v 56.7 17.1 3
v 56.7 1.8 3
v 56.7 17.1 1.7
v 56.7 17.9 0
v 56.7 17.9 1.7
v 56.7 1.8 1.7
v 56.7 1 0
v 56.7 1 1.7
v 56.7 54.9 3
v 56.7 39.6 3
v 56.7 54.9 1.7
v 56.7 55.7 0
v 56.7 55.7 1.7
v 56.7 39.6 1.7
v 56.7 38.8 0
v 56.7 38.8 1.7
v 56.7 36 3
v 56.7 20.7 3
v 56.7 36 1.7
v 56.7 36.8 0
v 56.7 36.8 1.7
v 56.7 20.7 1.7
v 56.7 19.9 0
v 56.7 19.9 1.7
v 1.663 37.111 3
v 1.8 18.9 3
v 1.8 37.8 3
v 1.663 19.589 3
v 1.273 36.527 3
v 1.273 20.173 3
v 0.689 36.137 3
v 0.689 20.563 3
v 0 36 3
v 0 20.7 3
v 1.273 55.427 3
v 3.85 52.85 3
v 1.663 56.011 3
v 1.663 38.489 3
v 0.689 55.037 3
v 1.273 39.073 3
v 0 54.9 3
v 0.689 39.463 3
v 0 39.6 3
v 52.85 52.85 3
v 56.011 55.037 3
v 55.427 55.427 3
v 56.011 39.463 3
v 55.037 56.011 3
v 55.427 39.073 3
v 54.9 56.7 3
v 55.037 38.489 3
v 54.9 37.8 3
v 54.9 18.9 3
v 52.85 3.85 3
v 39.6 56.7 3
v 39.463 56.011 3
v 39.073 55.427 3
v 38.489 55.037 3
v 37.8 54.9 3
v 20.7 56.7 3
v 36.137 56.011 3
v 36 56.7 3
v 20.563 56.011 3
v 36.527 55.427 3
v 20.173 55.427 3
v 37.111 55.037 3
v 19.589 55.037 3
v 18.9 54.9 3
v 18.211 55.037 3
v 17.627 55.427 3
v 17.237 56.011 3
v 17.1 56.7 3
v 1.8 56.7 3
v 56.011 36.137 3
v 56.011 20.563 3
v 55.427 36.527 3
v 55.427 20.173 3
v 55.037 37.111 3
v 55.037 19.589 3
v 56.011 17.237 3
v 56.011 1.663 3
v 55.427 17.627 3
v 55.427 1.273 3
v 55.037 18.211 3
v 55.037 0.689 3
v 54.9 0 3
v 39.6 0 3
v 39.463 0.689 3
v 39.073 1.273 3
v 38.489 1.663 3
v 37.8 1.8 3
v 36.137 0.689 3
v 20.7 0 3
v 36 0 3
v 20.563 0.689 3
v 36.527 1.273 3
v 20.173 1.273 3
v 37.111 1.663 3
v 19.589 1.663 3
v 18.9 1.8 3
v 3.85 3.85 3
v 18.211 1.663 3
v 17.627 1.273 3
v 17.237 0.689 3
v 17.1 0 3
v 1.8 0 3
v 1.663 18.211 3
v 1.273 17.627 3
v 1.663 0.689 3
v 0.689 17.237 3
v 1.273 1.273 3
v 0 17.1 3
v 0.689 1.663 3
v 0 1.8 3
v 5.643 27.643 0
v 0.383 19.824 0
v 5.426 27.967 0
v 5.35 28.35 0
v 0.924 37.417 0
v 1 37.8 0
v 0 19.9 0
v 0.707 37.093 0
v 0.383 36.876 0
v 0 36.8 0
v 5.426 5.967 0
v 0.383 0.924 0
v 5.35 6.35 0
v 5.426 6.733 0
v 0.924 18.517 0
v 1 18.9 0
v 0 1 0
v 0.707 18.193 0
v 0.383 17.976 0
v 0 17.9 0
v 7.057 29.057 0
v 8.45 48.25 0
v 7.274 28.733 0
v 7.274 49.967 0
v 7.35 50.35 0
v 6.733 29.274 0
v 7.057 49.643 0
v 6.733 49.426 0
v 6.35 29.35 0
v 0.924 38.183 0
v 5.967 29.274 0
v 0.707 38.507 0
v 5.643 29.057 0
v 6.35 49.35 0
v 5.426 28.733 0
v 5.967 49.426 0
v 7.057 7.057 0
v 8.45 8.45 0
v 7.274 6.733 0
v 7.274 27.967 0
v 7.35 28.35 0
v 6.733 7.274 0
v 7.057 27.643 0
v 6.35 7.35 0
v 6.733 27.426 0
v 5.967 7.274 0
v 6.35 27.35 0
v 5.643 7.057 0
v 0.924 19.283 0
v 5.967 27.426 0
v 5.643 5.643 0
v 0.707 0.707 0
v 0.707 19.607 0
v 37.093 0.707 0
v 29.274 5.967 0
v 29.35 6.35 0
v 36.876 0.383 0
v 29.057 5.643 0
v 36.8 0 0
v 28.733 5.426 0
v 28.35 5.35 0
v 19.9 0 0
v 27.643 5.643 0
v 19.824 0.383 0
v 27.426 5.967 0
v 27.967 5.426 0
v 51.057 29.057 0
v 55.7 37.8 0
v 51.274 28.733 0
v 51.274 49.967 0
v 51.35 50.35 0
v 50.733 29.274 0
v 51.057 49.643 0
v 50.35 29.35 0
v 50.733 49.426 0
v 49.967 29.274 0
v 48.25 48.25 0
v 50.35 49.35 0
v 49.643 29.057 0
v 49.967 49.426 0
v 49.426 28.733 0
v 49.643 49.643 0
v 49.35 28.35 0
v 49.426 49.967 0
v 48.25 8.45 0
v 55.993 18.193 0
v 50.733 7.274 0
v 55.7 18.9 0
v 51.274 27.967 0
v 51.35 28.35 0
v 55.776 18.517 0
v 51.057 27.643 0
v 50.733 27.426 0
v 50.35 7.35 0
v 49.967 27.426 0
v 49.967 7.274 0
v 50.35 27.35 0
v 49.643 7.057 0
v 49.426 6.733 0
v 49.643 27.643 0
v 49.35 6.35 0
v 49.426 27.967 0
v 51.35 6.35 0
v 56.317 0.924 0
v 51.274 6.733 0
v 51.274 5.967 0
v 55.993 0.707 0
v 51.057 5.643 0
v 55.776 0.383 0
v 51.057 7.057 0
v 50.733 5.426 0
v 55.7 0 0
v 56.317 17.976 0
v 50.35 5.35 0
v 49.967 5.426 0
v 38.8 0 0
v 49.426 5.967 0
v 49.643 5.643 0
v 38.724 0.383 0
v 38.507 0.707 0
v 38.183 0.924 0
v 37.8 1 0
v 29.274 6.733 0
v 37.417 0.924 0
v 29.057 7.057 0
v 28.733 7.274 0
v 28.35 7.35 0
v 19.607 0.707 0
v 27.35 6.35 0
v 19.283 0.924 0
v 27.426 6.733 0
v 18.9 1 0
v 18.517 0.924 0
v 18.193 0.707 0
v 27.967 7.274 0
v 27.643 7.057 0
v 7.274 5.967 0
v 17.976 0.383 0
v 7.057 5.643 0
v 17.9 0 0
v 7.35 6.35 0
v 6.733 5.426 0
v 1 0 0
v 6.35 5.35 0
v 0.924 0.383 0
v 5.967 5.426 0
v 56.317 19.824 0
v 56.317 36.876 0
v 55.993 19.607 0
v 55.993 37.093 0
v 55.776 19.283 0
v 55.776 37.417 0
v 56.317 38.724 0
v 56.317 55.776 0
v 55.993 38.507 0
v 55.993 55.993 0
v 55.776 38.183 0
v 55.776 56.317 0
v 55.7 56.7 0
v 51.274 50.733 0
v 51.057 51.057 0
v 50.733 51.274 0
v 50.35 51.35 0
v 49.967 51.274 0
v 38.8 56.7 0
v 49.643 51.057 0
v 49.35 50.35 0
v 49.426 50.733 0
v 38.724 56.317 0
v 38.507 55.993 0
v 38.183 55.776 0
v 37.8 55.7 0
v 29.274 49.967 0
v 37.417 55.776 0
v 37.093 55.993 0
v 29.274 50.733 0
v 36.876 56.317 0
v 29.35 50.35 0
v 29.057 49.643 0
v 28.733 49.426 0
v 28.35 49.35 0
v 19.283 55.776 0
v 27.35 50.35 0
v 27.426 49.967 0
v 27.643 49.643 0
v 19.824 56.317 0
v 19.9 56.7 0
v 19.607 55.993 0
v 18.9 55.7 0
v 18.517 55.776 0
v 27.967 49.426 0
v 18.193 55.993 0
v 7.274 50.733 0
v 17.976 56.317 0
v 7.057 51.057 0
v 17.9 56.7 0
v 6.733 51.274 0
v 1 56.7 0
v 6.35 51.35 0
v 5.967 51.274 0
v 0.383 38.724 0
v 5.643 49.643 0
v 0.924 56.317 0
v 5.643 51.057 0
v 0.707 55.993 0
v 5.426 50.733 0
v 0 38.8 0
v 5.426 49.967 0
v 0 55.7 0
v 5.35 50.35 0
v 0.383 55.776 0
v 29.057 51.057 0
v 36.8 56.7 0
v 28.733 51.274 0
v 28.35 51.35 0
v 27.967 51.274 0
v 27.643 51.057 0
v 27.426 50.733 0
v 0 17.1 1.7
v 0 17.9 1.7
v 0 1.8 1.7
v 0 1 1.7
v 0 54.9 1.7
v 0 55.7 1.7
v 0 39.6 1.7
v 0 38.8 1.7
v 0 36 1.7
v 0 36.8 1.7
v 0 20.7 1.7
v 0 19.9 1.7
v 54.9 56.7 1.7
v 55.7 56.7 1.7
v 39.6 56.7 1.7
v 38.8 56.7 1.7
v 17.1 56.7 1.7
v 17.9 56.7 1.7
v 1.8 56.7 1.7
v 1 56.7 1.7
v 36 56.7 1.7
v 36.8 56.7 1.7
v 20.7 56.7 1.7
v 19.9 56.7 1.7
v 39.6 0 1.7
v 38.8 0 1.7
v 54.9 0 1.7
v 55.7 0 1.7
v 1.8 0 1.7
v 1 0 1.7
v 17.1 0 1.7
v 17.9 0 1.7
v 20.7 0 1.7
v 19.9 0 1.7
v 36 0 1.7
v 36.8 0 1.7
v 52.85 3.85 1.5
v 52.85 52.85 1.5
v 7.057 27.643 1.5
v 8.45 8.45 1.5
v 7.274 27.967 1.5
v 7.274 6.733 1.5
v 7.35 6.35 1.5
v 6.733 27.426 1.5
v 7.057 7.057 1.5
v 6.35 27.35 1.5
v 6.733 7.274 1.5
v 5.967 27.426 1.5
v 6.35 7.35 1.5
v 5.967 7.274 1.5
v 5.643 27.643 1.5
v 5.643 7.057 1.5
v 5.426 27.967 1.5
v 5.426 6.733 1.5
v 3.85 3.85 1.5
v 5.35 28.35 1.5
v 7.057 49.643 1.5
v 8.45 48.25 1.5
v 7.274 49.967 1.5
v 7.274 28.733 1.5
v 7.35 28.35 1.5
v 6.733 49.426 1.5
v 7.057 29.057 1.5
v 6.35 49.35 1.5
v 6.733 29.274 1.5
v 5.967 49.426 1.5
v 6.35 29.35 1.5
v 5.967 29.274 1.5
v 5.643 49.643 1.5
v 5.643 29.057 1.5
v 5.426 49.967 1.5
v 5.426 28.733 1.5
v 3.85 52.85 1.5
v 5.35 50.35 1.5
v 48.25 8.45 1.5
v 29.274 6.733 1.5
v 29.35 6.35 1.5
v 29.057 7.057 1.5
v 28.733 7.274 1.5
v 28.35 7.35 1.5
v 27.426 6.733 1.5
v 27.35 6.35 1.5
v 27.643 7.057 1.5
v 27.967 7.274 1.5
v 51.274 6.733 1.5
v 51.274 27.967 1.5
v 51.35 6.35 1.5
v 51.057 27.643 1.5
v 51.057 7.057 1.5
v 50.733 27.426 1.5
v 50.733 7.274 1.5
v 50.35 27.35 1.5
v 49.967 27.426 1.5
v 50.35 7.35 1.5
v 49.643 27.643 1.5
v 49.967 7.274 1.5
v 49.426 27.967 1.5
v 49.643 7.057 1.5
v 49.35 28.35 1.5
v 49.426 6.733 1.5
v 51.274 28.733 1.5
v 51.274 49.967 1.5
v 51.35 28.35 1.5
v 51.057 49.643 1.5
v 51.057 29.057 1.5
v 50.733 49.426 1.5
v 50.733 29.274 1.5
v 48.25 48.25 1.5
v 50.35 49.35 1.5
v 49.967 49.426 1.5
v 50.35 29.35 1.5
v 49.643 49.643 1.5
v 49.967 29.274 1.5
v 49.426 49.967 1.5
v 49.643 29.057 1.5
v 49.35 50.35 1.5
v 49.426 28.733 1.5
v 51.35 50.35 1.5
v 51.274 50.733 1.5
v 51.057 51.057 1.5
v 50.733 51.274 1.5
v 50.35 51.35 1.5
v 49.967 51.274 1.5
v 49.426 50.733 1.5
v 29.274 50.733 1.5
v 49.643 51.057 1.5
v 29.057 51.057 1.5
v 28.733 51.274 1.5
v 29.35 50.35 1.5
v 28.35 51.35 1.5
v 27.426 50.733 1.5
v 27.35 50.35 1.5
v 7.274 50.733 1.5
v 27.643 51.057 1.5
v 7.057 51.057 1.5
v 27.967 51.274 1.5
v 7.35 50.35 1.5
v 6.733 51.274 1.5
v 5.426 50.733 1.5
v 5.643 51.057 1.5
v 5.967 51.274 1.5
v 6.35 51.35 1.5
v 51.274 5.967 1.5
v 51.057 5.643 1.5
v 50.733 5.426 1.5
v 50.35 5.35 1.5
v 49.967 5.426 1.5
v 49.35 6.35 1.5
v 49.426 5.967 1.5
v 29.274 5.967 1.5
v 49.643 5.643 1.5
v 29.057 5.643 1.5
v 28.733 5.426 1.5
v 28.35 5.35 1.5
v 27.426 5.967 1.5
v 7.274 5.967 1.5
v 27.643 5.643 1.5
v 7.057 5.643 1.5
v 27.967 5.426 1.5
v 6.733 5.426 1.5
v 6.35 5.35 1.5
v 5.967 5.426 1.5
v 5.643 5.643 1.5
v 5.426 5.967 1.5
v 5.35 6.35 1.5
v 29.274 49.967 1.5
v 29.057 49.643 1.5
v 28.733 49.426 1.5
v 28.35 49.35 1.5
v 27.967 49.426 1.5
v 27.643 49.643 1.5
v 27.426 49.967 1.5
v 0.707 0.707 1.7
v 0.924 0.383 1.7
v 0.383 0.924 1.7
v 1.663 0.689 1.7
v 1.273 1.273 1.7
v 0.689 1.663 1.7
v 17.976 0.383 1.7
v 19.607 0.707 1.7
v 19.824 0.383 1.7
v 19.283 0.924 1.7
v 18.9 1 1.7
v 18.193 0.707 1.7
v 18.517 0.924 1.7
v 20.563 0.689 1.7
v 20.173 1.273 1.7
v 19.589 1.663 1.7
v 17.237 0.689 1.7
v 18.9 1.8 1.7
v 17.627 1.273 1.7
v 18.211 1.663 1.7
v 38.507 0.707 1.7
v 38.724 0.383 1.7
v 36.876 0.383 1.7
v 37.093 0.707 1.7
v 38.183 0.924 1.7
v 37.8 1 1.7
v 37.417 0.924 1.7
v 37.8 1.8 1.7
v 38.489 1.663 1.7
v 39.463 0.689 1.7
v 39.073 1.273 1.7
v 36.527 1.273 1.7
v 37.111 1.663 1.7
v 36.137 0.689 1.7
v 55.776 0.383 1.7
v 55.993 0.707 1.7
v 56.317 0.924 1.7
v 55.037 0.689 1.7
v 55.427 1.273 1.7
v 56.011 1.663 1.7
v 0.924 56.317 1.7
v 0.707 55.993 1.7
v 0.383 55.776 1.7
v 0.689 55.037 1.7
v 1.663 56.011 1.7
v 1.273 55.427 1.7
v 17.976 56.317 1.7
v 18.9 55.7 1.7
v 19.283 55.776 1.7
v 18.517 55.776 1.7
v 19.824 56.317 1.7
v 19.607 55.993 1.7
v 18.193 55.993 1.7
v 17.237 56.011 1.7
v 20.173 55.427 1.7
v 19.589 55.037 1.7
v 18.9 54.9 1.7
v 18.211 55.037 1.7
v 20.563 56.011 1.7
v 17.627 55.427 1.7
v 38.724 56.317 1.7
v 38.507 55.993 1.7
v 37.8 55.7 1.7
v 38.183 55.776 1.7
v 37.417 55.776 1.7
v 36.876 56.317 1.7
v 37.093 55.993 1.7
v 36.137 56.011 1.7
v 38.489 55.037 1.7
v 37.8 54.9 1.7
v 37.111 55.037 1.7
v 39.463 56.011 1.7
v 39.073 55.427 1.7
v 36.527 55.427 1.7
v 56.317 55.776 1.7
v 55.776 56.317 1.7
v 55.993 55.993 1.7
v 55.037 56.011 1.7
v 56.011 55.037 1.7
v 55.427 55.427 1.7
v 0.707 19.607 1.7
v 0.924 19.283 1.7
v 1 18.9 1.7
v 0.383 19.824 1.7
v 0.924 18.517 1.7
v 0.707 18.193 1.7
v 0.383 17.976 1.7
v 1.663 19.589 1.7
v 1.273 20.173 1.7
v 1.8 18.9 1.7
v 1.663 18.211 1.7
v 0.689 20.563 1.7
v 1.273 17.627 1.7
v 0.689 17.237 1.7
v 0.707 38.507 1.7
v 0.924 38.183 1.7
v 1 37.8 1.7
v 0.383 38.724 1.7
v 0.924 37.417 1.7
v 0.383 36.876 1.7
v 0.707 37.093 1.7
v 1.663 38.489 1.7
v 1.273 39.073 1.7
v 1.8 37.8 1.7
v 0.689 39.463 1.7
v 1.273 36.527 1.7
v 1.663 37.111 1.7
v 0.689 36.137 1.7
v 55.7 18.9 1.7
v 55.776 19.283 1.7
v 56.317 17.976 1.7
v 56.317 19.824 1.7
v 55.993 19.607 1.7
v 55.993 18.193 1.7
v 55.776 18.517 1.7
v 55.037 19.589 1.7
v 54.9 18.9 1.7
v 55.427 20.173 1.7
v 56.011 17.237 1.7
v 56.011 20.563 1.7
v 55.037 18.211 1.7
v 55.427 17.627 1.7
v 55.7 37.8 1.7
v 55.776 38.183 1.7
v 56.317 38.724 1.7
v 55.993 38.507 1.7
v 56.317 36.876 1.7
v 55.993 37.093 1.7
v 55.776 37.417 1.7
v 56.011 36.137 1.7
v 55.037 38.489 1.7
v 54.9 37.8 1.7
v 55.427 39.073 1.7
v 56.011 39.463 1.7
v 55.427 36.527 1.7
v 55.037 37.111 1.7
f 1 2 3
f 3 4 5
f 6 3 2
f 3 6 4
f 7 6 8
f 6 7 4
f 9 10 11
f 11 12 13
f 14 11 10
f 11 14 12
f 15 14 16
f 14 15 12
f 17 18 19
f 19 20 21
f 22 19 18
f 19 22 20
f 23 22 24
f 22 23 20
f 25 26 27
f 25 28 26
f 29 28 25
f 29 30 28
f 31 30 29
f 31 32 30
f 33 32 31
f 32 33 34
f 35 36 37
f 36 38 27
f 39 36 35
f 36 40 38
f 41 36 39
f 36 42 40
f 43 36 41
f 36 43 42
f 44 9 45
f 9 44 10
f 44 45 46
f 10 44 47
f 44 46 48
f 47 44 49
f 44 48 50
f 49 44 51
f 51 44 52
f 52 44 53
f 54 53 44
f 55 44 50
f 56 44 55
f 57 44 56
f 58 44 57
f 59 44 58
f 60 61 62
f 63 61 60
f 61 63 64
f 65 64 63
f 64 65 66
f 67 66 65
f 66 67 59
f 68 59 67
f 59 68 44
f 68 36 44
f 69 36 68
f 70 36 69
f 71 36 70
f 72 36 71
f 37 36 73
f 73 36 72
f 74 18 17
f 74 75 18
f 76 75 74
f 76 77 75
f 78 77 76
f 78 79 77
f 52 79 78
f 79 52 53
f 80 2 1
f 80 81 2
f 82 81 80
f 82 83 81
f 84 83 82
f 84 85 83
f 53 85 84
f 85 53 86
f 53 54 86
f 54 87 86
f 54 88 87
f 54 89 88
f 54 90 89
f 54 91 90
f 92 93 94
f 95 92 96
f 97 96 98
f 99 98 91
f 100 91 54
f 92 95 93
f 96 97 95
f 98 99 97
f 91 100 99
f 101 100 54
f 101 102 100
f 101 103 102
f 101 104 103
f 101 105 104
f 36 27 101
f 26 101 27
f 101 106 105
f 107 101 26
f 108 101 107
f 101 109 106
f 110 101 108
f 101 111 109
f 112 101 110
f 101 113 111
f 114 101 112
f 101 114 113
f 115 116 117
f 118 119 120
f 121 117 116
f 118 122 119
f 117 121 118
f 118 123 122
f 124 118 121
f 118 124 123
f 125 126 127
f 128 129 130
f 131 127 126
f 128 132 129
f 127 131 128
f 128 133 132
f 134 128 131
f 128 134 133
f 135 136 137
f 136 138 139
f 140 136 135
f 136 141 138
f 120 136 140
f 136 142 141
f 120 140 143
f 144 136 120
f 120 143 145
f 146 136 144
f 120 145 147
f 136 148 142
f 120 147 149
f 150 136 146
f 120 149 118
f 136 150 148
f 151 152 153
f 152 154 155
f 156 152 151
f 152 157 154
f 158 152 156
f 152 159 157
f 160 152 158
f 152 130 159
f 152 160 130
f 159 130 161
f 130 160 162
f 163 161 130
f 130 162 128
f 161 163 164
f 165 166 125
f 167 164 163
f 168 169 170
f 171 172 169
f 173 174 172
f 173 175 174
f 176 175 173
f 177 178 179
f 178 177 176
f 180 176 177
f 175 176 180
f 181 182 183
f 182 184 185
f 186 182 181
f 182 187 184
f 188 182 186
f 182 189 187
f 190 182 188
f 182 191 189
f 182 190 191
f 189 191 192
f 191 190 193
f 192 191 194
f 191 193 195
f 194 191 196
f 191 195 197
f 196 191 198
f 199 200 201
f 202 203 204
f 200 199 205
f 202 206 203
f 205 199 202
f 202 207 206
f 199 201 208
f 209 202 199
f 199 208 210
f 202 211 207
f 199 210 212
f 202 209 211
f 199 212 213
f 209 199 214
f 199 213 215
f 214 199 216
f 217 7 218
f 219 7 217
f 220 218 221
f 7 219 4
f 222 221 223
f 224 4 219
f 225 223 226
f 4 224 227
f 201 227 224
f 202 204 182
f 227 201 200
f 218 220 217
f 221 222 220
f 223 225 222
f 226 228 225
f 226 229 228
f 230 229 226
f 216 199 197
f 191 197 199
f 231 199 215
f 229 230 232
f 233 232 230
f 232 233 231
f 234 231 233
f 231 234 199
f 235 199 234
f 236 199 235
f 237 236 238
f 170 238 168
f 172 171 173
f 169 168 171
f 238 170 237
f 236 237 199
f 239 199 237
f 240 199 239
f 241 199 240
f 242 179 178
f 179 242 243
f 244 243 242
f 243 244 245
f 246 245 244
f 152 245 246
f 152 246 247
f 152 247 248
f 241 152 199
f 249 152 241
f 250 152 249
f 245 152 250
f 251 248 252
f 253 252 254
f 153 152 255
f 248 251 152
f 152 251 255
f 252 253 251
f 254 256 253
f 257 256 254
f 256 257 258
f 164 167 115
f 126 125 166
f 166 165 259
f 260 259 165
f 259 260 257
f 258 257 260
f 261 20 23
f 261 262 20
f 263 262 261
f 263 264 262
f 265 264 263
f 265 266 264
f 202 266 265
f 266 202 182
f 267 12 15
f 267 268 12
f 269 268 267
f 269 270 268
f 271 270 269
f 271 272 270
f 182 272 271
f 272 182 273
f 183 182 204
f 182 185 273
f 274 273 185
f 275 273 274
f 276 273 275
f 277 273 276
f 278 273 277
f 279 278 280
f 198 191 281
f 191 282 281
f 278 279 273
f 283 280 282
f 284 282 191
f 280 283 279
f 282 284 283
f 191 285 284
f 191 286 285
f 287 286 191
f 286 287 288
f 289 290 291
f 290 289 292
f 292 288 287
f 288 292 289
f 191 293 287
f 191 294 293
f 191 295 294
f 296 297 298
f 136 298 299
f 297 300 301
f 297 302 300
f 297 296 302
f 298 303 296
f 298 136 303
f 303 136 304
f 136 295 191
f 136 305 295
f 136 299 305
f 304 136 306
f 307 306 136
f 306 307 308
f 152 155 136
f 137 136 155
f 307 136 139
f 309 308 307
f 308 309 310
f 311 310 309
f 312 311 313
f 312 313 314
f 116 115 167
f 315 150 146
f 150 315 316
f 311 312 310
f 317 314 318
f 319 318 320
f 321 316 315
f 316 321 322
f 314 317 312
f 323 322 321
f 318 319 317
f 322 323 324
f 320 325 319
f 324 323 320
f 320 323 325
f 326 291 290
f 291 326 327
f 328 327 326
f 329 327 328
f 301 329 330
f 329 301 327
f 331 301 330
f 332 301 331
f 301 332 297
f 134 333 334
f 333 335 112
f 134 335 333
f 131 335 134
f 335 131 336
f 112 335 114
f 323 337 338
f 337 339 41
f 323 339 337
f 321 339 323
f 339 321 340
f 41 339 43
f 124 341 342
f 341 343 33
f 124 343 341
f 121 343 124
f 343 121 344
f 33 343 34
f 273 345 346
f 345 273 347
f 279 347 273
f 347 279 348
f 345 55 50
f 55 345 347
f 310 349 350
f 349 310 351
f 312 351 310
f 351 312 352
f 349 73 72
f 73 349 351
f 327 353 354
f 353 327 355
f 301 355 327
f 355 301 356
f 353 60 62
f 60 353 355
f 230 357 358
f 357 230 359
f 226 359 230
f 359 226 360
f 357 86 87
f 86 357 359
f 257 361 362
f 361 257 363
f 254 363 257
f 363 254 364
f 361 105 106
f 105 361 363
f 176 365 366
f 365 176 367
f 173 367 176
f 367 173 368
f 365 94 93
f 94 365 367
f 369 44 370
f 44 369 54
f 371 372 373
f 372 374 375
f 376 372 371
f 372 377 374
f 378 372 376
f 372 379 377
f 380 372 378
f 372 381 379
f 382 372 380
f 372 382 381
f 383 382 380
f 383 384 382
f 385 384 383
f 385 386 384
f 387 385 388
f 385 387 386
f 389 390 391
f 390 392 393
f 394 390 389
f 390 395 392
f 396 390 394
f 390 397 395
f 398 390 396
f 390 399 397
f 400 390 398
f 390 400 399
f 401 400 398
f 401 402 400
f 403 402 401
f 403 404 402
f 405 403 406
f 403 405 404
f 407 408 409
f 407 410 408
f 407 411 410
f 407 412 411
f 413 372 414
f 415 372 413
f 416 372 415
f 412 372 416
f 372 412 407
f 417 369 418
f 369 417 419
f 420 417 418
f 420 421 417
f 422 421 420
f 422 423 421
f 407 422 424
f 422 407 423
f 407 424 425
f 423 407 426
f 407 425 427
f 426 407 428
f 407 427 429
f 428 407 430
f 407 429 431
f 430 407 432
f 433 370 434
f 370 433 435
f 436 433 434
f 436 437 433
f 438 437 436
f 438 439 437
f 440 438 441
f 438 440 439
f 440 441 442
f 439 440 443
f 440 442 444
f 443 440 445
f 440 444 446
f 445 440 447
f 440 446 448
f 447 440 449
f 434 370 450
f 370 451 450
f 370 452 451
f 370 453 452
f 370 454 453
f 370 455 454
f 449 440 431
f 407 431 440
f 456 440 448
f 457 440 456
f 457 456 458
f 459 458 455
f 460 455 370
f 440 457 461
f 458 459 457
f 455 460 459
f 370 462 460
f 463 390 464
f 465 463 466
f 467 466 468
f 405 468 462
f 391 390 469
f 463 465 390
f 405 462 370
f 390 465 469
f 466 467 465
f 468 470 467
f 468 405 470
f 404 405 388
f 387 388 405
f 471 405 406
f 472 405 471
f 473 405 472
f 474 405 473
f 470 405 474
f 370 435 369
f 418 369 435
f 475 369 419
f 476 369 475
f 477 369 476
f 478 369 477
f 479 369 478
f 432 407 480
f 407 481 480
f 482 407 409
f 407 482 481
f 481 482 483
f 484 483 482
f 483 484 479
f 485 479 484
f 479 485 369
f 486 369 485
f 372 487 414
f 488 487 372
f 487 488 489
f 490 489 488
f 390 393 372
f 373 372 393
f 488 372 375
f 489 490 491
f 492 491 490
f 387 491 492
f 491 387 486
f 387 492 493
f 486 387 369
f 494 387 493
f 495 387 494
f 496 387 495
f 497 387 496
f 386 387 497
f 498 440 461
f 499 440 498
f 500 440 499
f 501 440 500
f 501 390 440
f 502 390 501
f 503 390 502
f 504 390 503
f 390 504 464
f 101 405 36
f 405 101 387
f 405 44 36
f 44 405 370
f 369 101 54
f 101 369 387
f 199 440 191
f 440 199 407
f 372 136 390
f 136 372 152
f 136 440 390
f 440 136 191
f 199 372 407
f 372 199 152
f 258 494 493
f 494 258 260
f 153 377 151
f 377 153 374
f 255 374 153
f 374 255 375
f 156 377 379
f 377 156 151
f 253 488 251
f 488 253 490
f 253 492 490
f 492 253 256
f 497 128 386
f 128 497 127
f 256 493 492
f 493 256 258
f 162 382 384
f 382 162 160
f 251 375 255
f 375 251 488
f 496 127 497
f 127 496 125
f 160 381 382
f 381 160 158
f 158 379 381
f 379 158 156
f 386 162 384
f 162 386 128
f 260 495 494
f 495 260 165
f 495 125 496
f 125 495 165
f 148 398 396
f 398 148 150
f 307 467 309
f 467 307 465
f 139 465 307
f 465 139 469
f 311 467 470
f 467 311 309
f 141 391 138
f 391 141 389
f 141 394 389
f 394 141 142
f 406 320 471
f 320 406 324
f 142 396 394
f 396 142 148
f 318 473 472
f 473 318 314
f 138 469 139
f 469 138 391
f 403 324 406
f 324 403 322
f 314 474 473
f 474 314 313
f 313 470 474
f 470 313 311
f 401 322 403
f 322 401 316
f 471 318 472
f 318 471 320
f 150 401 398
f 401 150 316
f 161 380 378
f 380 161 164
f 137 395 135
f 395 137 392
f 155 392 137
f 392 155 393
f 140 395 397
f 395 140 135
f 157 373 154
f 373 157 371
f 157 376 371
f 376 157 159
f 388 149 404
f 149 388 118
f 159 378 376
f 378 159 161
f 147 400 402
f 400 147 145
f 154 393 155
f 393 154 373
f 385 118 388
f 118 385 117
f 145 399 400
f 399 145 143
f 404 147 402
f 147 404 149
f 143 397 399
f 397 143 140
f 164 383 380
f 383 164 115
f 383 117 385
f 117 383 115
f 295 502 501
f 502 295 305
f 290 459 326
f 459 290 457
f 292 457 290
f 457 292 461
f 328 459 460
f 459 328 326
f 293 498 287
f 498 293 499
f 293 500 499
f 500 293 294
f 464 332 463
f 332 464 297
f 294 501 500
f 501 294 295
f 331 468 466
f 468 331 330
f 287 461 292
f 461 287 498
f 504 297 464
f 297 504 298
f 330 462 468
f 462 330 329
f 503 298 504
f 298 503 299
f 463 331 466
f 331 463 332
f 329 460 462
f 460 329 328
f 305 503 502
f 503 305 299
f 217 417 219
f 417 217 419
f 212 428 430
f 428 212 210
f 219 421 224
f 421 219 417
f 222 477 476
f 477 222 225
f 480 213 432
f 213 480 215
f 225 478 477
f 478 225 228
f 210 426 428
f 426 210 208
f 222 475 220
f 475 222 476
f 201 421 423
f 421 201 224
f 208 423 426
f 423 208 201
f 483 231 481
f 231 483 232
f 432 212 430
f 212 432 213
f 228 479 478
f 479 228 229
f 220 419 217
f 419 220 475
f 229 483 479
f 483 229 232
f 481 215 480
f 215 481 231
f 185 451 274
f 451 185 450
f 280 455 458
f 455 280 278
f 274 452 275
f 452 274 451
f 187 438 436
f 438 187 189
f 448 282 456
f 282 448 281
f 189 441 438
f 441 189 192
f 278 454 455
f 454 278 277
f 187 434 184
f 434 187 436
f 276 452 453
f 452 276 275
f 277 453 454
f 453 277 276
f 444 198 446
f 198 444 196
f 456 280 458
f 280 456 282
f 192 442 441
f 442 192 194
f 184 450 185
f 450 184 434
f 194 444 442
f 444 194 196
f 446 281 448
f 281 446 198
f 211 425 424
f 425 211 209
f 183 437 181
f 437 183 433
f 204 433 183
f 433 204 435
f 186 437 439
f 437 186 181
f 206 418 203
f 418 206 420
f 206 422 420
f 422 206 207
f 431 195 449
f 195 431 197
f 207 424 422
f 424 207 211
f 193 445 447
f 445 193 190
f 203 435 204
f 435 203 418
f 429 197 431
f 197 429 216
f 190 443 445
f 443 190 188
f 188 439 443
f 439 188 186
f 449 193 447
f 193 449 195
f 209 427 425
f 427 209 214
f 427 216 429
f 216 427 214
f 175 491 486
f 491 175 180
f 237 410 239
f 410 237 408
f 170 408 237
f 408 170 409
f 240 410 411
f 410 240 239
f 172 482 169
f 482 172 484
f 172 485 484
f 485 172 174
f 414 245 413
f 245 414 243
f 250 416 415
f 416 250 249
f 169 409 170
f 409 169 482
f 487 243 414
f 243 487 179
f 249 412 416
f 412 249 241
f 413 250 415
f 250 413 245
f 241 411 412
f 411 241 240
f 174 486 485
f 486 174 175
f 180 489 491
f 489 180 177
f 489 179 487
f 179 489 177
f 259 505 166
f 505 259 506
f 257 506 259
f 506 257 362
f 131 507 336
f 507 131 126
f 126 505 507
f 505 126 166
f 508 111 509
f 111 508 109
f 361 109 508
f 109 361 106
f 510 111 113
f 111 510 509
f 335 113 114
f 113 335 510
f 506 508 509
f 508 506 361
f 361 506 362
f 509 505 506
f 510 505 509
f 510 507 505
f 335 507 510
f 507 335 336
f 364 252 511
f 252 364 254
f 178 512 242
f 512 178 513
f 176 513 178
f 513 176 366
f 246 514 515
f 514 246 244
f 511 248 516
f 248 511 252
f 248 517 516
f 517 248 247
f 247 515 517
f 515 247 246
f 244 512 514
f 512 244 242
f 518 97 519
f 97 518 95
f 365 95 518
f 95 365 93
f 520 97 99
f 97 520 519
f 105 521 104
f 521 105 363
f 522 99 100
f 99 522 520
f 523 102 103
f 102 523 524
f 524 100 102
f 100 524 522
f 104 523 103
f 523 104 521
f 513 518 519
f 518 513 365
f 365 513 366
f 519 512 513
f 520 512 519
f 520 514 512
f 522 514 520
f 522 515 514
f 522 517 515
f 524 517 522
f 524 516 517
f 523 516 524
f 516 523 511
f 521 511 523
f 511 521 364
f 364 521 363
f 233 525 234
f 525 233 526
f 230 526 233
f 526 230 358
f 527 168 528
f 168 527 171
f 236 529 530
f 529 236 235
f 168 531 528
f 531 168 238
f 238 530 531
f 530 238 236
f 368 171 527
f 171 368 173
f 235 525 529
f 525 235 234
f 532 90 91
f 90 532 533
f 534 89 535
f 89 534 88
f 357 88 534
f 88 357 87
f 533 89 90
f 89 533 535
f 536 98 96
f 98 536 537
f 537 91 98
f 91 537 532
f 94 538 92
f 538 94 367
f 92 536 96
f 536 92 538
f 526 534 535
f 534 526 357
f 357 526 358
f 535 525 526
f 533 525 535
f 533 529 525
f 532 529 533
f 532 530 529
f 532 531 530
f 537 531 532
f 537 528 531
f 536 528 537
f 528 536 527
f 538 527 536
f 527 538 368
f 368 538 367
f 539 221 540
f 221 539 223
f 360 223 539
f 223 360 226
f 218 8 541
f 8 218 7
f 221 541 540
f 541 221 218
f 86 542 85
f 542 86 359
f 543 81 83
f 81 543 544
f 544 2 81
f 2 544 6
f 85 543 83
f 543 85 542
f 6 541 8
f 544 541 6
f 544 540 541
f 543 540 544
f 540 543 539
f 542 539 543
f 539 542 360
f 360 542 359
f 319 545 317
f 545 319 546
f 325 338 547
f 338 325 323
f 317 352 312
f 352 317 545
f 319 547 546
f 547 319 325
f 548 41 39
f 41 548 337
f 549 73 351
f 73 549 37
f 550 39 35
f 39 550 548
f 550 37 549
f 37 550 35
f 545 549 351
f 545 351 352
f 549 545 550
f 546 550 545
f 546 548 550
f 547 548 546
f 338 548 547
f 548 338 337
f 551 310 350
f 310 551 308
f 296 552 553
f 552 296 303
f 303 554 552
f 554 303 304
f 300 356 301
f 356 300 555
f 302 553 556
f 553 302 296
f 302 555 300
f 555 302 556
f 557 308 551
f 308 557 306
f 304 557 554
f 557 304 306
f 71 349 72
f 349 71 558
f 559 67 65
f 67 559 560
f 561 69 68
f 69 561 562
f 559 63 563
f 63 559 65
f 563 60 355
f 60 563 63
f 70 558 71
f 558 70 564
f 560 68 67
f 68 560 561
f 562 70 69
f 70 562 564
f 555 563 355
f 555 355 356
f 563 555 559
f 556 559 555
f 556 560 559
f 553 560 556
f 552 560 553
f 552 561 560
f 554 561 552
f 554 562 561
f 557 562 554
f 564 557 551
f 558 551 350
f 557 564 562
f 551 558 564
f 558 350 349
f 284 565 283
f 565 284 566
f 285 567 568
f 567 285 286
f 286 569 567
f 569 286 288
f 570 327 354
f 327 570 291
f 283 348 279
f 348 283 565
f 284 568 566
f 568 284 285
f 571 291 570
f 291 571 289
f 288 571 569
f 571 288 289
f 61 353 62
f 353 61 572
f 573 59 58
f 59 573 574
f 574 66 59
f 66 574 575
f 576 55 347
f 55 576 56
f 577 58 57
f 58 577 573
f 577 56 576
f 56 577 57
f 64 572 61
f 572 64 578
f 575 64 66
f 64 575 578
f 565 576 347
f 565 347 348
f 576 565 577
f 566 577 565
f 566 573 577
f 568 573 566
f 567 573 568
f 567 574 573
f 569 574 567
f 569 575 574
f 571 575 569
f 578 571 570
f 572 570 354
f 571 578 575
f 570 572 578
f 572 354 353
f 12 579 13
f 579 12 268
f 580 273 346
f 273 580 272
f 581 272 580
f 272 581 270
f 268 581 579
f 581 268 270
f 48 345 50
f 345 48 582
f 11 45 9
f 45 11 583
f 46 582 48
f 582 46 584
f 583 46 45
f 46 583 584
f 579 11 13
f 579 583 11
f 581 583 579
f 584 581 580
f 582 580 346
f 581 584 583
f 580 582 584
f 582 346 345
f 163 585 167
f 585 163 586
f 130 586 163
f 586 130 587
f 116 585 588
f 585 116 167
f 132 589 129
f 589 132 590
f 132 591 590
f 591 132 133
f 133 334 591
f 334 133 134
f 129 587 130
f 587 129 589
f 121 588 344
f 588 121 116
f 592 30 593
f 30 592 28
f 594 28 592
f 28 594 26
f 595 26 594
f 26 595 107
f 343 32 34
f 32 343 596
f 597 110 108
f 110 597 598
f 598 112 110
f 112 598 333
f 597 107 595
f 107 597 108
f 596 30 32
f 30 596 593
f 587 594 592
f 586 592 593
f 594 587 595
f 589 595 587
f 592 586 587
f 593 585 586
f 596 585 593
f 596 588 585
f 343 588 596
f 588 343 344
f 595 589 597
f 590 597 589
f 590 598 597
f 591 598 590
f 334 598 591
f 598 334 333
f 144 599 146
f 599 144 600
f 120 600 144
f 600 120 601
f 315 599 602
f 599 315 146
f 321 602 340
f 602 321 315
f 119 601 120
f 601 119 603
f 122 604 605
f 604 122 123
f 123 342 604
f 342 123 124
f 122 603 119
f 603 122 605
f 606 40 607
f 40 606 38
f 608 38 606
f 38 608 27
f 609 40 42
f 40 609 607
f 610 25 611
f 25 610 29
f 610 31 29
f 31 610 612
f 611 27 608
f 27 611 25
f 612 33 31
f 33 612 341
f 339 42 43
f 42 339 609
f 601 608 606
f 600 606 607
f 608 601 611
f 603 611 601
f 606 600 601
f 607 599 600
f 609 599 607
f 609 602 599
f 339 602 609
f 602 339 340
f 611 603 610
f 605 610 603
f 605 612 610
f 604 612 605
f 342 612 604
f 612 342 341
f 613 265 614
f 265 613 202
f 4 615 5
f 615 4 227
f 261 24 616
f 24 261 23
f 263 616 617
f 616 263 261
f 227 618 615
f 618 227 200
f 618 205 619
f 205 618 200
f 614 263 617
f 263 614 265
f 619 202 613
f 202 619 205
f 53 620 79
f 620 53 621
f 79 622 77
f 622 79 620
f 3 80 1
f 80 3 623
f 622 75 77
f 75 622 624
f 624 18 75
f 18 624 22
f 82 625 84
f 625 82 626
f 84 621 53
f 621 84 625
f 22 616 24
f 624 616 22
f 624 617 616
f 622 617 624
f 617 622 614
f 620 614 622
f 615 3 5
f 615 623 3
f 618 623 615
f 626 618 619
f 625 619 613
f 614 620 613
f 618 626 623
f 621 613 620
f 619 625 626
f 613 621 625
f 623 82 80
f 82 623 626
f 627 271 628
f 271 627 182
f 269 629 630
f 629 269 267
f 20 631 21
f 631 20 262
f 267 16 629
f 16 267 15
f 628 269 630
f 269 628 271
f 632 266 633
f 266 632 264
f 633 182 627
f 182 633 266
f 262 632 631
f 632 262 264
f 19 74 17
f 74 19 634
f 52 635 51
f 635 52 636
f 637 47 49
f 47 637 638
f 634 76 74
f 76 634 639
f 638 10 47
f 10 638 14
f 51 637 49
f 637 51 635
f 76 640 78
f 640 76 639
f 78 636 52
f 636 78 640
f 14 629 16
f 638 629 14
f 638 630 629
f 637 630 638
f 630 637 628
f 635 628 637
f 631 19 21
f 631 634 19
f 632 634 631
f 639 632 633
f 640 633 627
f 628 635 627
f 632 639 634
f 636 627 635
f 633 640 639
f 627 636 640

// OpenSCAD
//OpenSCAD-Skript

//Moduldefinition mit Parametern für Frontplattensystem im 19mm-Raster
module FrontElem (
//Parameter
//Frontplattenelement
xwert=3,        //Anzahl der Segmente in horizontaler Richtung
ywert=3,        //Anzahl der Segmente in vertikaler Richtung
segment=18.9,   //Kantenlänge des Segments
hght=3.0,       //Höhe des Rands des Frontplattensegments
thick=1.5,      //verbleibende Dicke des Frontplattensegments
wo=1.0,         //Wandstärke oben
wu=2.0,         //Wandstärke unten
//M3-Schrauben
M3=false,       //Bohrungen für M3-Zylinderkopf-Inbusschraube
skd3=5.6,       //Schraubenkopfdurchmesser M3-Schraube
skh3=3.3,       //Schraubenkopfhöhe M3-Schraube
dsh3=3.1,       //Schaftdurchmesser M3-Schraube
dvst3=7,        //Verstärkung für M3-Schraube
//Schneidschrauben 2mmx6mm
B2mm=true,      //Bohrungen für 2mm-Schneidschrauben
skd2=3.6,       //Schraubenkopfdurchmesser 2mm-Schraube (4.4)
skh2=1.3,       //Schraubenkopfhöhe 2mm-Schraube
dsh2=2.0,       //Schaftdurchmesser 2mm-Schraube
dvst2=4.4,      //Verstärkung für 2mm-Schraube
//Beschriftungsfeld eingesenkt
Btext=6.0,      //Breite Beschriftungsband
Ltext=12,       //Länge Beschriftungsband
Dtext=0.3,      //Tiefe Beschriftungsfeld, oder Null
//LED 3mm
LEDdia=3.0,     //Durchmesser LED
//Quadrat-LED
LEDr=5.0,       //Kantenlänge quadratische LED
//Rechteck-LED
LEDB=5.0,       //Breite der Rechteck-LED
LEDH=3.0,       //Höhe der Rechteck-LED
//Hebel-Kippschalter
KSWdia=6.0,     //Schaftdurchmesser Kippschalter
//Drehschalter
RSWdia=9.2,     //Schaftdurchmesser Drehschalter
RSWdist=9.4,    //Mittenabstand Pin
RSWpin=3.0,     //Durchmesser Pin
//Bohrung für Potischaft 6mm
POTdia=6.8,     //Schaftdurchmesser Poti
//Polklemme M4
TRMdia=4.0,     //Bohrung für Polklemme M4
TRSdia=6.0,     //Bohrung für Telefonbuchse 4mm
//MC-Einbaubuchse
MCdia=11.8,     //Bohrung für MC-Buchse 4mm
MCdist=10.4,    //Abstand Abflachungen
//BNC-Einbaubuchse
BNCdia=9.5,     //Durchmesser Bohrung
BNCdist=8.0,    //Abstand Abflachung
//Panelmeter 3-stellig
PM3B=22.5,      //Breite Panelmeter 3-stellig
PM3H=14.5,      //Höhe Panelmeter 3-stellig
//Panelmeter 4-stellig
PM4B=30.0,      //Breite Panelmeter 4-stellig
PM4H=14.2,      //Höhe Panelmeter 4-stellig
//Kaltgerätestecker
KGSW=27.3,      //Länge Ausschnitt in x-Richtung Kaltgerätestecker
KGSH=20,        //Höhe Ausschnitt in y-Richtung Kaltgerätestecker
KGSR=9          //Rundungsdurchmesser Ausschnitt Kaltgerätestecker
)
//Beginn Modul
{
difference(){   //difference 1
union(){        //union 1
difference(){   //difference 2
union(){        //union 2
    //alles, was vor der nächsten geschweiften Klammer steht, wird zusammengefügt (union 2)
//Körper des Frontplattensegments
cube([xwert*segment, ywert*segment, hght]);


}               //union 2 end
    //alles, was vor der nächsten geschweiften Klammer steht, wird davon abgezogen (difference 2)
/*//Einsenkung in das Segment
polyhedron(
               points= [[wu,wu,thick],                                  //0 unten
                        [xwert*segment-wu,wu,thick],                    //1 unten
                        [xwert*segment-wu,ywert*segment-wu,thick],      //2 unten
                        [wu,ywert*segment-wu,thick],                    //3 unten
                        [wo,wo,hght+0.01],                              //4 oben
                        [wo,ywert*segment-wo, hght+0.01],               //5 oben
                        [xwert*segment-wo,ywert*segment-wo,hght+0.01],  //6 oben
                        [xwert*segment-wo,wo,hght+0.01],                //7 oben
                       ],
               faces=  [[0,1,2,3],      //Boden
                        [0,4,7,1],      //Deckel
                        [1,7,6,2],      //Front
                        [2,6,5,3],      //Seitenwand rechts
                        [3,5,4,0],      //Rückwand
                        [4,5,6,7]]      //Seitenwand links
               );  */ 
//Ausschnitt Rahmen VU-Meter
translate([xwert*segment/2-49/2,ywert*segment/2-49/2,thick]) cube([49,49,15]);

/*
//Ausschnitt Schalter
translate([xwert*segment/2-30/2,ywert*segment/2+4.5,-0.1]) cube([30,11,20]);
*/

/*//Ausschnitt Kaltgerätestecker
translate([0,7,0]) {
//Mittenausschnitt
translate([xwert*segment/2-22/2,ywert*segment/2-14,-0.1]) cube([22,14,20]);
//Rundungen
translate([xwert*segment/2-22/2,ywert*segment/2-14,-0.1])cylinder(d=8,h=20,$fn=32);
translate([xwert*segment/2-22/2,ywert*segment/2,-0.1])cylinder(d=8,h=20,$fn=32);
translate([xwert*segment/2+22/2,ywert*segment/2-14,-0.1])cylinder(d=8,h=20,$fn=32);
translate([xwert*segment/2+22/2,ywert*segment/2,-0.1])cylinder(d=8,h=20,$fn=32);
//Seitensegmente
translate([xwert*segment/2-22/2,ywert*segment/2-0.1,-0.1]) cube([22,4+0.1,20]);
translate([xwert*segment/2-22/2,ywert*segment/2-14-4,-0.1]) cube([22,4+0.1,20]);
translate([xwert*segment/2-22/2-4,ywert*segment/2-14,-0.1]) cube([4+0.1,14,20]);
translate([xwert*segment/2+22/2-0.1,ywert*segment/2-14,-0.1]) cube([4+0.1,14,20]);
//Schraubenlöcher
translate([xwert*segment/2-36/2,ywert*segment/2-14/2,-0.1])cylinder(d1=3,d2=7,h=2,$fn=32);
translate([xwert*segment/2+36/2,ywert*segment/2-14/2,-0.1])cylinder(d1=3,d2=7,h=2,$fn=32);
};
*/

/*
//Bohrung für LED mittig (Mindestgröße 1x1)
translate([xwert*segment/2,ywert*segment/2-3,-0.1])  cylinder(d=LEDdia, h=10, $fn=32);
*/

/*
//Bohrung für 2x 3mm-LED nach unten versetzt mit Textfeld darüber (Mindestgröße 1x1, bei 10mm LED 1x2)
translate([xwert*segment/2-3,ywert*segment/2-3,-0.1])  cylinder(d=LEDdia, h=10, $fn=32);
translate([xwert*segment/2+3,ywert*segment/2-3,-0.1])  cylinder(d=LEDdia, h=10, $fn=32);
translate([xwert*segment/2-Ltext/2,ywert*segment/2,thick-Dtext+0.05])  cube([Ltext, Btext, Dtext]); 
*/

/*
//Bohrung für Kippschalter mittig (Mindestgröße 1x1)
translate([xwert*segment/2,ywert*segment/2,-0.1])  cylinder(d=KSWdia, h=10, $fn=32); 
*/

/*
//Bohrungen für Drehschalter mit Pin (Mindestgröße 2x2)
translate([xwert*segment/2,ywert*segment/2,-0.1])  cylinder(d=RSWdia, h=10, $fn=32);
translate([xwert*segment/2+RSWdist,ywert*segment/2,-0.1])  cylinder(d=RSWpin, h=1.5, $fn=32);
*/

/*
//Bohrung für Potentiometer 3mm-Schaft (Mindestgröße 1x1)
translate([xwert*segment/2,ywert*segment/2,-0.1])  cylinder(d=POTdia, h=10, $fn=32);
*/

/*
//Bohrung für 2x 4mm-Polklemme M4 (Mindestgröße 1x1)
translate([xwert*segment/2-10,ywert*segment/2,-0.1])  cylinder(d=TRMdia, h=10, $fn=32);
translate([xwert*segment/2+10,ywert*segment/2,-0.1])  cylinder(d=TRMdia, h=10, $fn=32);
*/
/*
//Bohrung für 4mm-Telefonbuchse (Mindestgröße 1x1)
translate([xwert*segment/2,ywert*segment/2,-0.1])  cylinder(d=TRSdia, h=10, $fn=32);
*/

/*
//Bohrung für 4mm-MC-Buchse (Mindestgröße 2x2), siehe auch union1 für Abflachungen
translate([xwert*segment/2,ywert*segment/2,-0.1])  cylinder(d=MCdia, h=10, $fn=32);
*/

/*
//Bohrung für BNC-Buchse (Mindestgröße 1x1), siehe auch union1 für Abflachungen
translate([xwert*segment/2,ywert*segment/2,-0.1])  cylinder(d=BNCdia, h=10, $fn=32);
*/

/*
//Ausschnitt Panelmeter 3-stellig (Mindestgröße 2x1)
translate([xwert*segment/2-PM3B/2,ywert*segment/2-PM3H/2,-0.1])  cube([PM3B, PM3H, 10]);
*/

/*
//Ausschnitt Panelmeter 4-stellig (Mindestgröße 2x1)
translate([xwert*segment/2-PM4B/2,ywert*segment/2-PM4H/2,-0.1])  cube([PM4B, PM4H, 10]);
*/       


//Ausschnitt VU-Meter 40x40mm(Mindestgröße 3x3)
translate([xwert*segment/2-39.8/2,ywert*segment/2-39.8/2,-0.1])  cube([39.8, 39.8, 10]);
//Bohrungen Schrauben
translate([xwert*segment/2-44/2,ywert*segment/2-44/2,-0.1])  cylinder(d=dsh2,h=10,$fn=16);
translate([xwert*segment/2-44/2,ywert*segment/2+44/2,-0.1])  cylinder(d=dsh2,h=10,$fn=16);
translate([xwert*segment/2-44/2,ywert*segment/2,-0.1])  cylinder(d=dsh2,h=10,$fn=16);
translate([xwert*segment/2,ywert*segment/2+44/2,-0.1])  cylinder(d=dsh2,h=10,$fn=16);
translate([xwert*segment/2+44/2,ywert*segment/2-44/2,-0.1])  cylinder(d=dsh2,h=10,$fn=16);
translate([xwert*segment/2+44/2,ywert*segment/2+44/2,-0.1])  cylinder(d=dsh2,h=10,$fn=16);
translate([xwert*segment/2+44/2,ywert*segment/2,-0.1])  cylinder(d=dsh2,h=10,$fn=16);
translate([xwert*segment/2,ywert*segment/2-44/2,-0.1])  cylinder(d=dsh2,h=10,$fn=16);
}  //difference 2 end
    //alles, was vor der nächsten geschweiften Klammer steht, wird dazu hinzugefügt (union 1)
//Verstärkungen für Schrauben x-Achse unten
for (x=[0:segment:xwert*segment])
{
if (M3==true) translate([x,0,0]) cylinder(d=dvst3,h=hght,$fn=16);
if (B2mm==true) translate([x,0,0]) cylinder(d=dvst2,h=hght,$fn=16);
}
//Verstärkungen für Schrauben x-Achse oben
for (x=[0:segment:xwert*segment])
{
if (M3==true) translate([x,ywert*segment,0]) cylinder(d=dvst3,h=hght,$fn=16);
if (B2mm==true) translate([x,ywert*segment,0]) cylinder(d=dvst2,h=hght,$fn=16);
}
//Verstärkungen für Schrauben y-Achse links
for (y=[0:segment:ywert*segment])
{
if (M3==true) translate([0,y,0]) cylinder(d=dvst3,h=hght,$fn=16);
if (B2mm==true) translate([0,y,0]) cylinder(d=dvst2,h=hght,$fn=16);
}
//Verstärkungen für Schrauben y-Achse rechts
for (y=[0:segment:ywert*segment])
{
if (M3==true) translate([xwert*segment,y,0]) cylinder(d=dvst3,h=hght,$fn=16);
if (B2mm==true) translate([xwert*segment,y,0]) cylinder(d=dvst2,h=hght,$fn=16);
}

/*
//Abflachungen für 4mm-MC-Buchse (Mindestgröße 2x2)
translate([xwert*segment/2-5,ywert*segment/2+MCdist/2,0])  cube([10,3,thick]);
translate([xwert*segment/2-5,ywert*segment/2-MCdist/2-3,0])  cube([10,3,thick]);
*/

/*
//Abflachungen für BNC-Buchse (Mindestgröße 1x1)
translate([xwert*segment/2-5,ywert*segment/2+BNCdist/2,0])  cube([10,3,thick]);
translate([xwert*segment/2-5,ywert*segment/2-BNCdist/2-3,0])  cube([10,3,thick]);
*/

}               //union 1 end
    //alles, was vor der nächsten geschweiften Klammer steht, wird davon wieder abgezogen (difference 1)
//Bohrungen für Schrauben x-Achse unten
for (x=[0:segment:xwert*segment])
{
if (M3==true) translate([x,0,-0.1]) cylinder(d=dsh3,h=2*hght,$fn=16);
if (M3==true) translate([x,0,hght-skh3]) cylinder(d=skd3,h=2*hght,$fn=16);
if (B2mm==true) translate([x,0,-0.1]) cylinder(d=dsh2,h=2*hght,$fn=16);
if (B2mm==true) translate([x,0,hght-skh2]) cylinder(d=skd2,h=2*hght,$fn=16); 
}
//Bohrungen für Schrauben x-Achse oben
for (x=[0:segment:xwert*segment])
{
if (M3==true) translate([x,ywert*segment,-0.1]) cylinder(d=dsh3,h=2*hght,$fn=16);
if (M3==true) translate([x,ywert*segment,hght-skh3]) cylinder(d=skd3,h=2*hght,$fn=16);
if (B2mm==true) translate([x,ywert*segment,-0.1]) cylinder(d=dsh2,h=2*hght,$fn=16);
if (B2mm==true) translate([x,ywert*segment,hght-skh2]) cylinder(d=skd2,h=2*hght,$fn=16); 
}
//Bohrungen für Schrauben y-Achse links
for (y=[0:segment:ywert*segment])
{
if (M3==true) translate([0,y,-0.1]) cylinder(d=dsh3,h=2*hght,$fn=16);
if (M3==true) translate([0,y,hght-skh3]) cylinder(d=skd3,h=2*hght,$fn=16);
if (B2mm==true) translate([0,y,-0.1]) cylinder(d=dsh2,h=2*hght,$fn=16);
if (B2mm==true) translate([0,y,hght-skh2]) cylinder(d=skd2,h=2*hght,$fn=16); 
}
//Bohrungen für Schrauben y-Achse rechts
for (y=[0:segment:ywert*segment])
{
if (M3==true) translate([xwert*segment,y,-0.1]) cylinder(d=dsh3,h=2*hght,$fn=16);
if (M3==true) translate([xwert*segment,y,hght-skh3]) cylinder(d=skd3,h=2*hght,$fn=16);
if (B2mm==true) translate([xwert*segment,y,-0.1]) cylinder(d=dsh2,h=2*hght,$fn=16);
if (B2mm==true) translate([xwert*segment,y,hght-skh2]) cylinder(d=skd2,h=2*hght,$fn=16); 
}
//Abschneiden Verstärkungen unten
translate([-250,-10,-0.1])
cube([500,10,25]);
//Abschneiden Verstärkungen oben
translate([-250,ywert*segment,-0.1])
cube([500,10,25]);
//Abschneiden Verstärkungen links
translate([-10,-250,-0.1])
cube([10,500,25]);
//Abschneiden Verstärkungen rechts
translate([xwert*segment,-250,-0.1])
cube([10,500,25]);
}               //difference 1 end

}  //module end

//Hier werden Instanzen des Moduls aufgerufen
translate([0,0,0]) FrontElem();
